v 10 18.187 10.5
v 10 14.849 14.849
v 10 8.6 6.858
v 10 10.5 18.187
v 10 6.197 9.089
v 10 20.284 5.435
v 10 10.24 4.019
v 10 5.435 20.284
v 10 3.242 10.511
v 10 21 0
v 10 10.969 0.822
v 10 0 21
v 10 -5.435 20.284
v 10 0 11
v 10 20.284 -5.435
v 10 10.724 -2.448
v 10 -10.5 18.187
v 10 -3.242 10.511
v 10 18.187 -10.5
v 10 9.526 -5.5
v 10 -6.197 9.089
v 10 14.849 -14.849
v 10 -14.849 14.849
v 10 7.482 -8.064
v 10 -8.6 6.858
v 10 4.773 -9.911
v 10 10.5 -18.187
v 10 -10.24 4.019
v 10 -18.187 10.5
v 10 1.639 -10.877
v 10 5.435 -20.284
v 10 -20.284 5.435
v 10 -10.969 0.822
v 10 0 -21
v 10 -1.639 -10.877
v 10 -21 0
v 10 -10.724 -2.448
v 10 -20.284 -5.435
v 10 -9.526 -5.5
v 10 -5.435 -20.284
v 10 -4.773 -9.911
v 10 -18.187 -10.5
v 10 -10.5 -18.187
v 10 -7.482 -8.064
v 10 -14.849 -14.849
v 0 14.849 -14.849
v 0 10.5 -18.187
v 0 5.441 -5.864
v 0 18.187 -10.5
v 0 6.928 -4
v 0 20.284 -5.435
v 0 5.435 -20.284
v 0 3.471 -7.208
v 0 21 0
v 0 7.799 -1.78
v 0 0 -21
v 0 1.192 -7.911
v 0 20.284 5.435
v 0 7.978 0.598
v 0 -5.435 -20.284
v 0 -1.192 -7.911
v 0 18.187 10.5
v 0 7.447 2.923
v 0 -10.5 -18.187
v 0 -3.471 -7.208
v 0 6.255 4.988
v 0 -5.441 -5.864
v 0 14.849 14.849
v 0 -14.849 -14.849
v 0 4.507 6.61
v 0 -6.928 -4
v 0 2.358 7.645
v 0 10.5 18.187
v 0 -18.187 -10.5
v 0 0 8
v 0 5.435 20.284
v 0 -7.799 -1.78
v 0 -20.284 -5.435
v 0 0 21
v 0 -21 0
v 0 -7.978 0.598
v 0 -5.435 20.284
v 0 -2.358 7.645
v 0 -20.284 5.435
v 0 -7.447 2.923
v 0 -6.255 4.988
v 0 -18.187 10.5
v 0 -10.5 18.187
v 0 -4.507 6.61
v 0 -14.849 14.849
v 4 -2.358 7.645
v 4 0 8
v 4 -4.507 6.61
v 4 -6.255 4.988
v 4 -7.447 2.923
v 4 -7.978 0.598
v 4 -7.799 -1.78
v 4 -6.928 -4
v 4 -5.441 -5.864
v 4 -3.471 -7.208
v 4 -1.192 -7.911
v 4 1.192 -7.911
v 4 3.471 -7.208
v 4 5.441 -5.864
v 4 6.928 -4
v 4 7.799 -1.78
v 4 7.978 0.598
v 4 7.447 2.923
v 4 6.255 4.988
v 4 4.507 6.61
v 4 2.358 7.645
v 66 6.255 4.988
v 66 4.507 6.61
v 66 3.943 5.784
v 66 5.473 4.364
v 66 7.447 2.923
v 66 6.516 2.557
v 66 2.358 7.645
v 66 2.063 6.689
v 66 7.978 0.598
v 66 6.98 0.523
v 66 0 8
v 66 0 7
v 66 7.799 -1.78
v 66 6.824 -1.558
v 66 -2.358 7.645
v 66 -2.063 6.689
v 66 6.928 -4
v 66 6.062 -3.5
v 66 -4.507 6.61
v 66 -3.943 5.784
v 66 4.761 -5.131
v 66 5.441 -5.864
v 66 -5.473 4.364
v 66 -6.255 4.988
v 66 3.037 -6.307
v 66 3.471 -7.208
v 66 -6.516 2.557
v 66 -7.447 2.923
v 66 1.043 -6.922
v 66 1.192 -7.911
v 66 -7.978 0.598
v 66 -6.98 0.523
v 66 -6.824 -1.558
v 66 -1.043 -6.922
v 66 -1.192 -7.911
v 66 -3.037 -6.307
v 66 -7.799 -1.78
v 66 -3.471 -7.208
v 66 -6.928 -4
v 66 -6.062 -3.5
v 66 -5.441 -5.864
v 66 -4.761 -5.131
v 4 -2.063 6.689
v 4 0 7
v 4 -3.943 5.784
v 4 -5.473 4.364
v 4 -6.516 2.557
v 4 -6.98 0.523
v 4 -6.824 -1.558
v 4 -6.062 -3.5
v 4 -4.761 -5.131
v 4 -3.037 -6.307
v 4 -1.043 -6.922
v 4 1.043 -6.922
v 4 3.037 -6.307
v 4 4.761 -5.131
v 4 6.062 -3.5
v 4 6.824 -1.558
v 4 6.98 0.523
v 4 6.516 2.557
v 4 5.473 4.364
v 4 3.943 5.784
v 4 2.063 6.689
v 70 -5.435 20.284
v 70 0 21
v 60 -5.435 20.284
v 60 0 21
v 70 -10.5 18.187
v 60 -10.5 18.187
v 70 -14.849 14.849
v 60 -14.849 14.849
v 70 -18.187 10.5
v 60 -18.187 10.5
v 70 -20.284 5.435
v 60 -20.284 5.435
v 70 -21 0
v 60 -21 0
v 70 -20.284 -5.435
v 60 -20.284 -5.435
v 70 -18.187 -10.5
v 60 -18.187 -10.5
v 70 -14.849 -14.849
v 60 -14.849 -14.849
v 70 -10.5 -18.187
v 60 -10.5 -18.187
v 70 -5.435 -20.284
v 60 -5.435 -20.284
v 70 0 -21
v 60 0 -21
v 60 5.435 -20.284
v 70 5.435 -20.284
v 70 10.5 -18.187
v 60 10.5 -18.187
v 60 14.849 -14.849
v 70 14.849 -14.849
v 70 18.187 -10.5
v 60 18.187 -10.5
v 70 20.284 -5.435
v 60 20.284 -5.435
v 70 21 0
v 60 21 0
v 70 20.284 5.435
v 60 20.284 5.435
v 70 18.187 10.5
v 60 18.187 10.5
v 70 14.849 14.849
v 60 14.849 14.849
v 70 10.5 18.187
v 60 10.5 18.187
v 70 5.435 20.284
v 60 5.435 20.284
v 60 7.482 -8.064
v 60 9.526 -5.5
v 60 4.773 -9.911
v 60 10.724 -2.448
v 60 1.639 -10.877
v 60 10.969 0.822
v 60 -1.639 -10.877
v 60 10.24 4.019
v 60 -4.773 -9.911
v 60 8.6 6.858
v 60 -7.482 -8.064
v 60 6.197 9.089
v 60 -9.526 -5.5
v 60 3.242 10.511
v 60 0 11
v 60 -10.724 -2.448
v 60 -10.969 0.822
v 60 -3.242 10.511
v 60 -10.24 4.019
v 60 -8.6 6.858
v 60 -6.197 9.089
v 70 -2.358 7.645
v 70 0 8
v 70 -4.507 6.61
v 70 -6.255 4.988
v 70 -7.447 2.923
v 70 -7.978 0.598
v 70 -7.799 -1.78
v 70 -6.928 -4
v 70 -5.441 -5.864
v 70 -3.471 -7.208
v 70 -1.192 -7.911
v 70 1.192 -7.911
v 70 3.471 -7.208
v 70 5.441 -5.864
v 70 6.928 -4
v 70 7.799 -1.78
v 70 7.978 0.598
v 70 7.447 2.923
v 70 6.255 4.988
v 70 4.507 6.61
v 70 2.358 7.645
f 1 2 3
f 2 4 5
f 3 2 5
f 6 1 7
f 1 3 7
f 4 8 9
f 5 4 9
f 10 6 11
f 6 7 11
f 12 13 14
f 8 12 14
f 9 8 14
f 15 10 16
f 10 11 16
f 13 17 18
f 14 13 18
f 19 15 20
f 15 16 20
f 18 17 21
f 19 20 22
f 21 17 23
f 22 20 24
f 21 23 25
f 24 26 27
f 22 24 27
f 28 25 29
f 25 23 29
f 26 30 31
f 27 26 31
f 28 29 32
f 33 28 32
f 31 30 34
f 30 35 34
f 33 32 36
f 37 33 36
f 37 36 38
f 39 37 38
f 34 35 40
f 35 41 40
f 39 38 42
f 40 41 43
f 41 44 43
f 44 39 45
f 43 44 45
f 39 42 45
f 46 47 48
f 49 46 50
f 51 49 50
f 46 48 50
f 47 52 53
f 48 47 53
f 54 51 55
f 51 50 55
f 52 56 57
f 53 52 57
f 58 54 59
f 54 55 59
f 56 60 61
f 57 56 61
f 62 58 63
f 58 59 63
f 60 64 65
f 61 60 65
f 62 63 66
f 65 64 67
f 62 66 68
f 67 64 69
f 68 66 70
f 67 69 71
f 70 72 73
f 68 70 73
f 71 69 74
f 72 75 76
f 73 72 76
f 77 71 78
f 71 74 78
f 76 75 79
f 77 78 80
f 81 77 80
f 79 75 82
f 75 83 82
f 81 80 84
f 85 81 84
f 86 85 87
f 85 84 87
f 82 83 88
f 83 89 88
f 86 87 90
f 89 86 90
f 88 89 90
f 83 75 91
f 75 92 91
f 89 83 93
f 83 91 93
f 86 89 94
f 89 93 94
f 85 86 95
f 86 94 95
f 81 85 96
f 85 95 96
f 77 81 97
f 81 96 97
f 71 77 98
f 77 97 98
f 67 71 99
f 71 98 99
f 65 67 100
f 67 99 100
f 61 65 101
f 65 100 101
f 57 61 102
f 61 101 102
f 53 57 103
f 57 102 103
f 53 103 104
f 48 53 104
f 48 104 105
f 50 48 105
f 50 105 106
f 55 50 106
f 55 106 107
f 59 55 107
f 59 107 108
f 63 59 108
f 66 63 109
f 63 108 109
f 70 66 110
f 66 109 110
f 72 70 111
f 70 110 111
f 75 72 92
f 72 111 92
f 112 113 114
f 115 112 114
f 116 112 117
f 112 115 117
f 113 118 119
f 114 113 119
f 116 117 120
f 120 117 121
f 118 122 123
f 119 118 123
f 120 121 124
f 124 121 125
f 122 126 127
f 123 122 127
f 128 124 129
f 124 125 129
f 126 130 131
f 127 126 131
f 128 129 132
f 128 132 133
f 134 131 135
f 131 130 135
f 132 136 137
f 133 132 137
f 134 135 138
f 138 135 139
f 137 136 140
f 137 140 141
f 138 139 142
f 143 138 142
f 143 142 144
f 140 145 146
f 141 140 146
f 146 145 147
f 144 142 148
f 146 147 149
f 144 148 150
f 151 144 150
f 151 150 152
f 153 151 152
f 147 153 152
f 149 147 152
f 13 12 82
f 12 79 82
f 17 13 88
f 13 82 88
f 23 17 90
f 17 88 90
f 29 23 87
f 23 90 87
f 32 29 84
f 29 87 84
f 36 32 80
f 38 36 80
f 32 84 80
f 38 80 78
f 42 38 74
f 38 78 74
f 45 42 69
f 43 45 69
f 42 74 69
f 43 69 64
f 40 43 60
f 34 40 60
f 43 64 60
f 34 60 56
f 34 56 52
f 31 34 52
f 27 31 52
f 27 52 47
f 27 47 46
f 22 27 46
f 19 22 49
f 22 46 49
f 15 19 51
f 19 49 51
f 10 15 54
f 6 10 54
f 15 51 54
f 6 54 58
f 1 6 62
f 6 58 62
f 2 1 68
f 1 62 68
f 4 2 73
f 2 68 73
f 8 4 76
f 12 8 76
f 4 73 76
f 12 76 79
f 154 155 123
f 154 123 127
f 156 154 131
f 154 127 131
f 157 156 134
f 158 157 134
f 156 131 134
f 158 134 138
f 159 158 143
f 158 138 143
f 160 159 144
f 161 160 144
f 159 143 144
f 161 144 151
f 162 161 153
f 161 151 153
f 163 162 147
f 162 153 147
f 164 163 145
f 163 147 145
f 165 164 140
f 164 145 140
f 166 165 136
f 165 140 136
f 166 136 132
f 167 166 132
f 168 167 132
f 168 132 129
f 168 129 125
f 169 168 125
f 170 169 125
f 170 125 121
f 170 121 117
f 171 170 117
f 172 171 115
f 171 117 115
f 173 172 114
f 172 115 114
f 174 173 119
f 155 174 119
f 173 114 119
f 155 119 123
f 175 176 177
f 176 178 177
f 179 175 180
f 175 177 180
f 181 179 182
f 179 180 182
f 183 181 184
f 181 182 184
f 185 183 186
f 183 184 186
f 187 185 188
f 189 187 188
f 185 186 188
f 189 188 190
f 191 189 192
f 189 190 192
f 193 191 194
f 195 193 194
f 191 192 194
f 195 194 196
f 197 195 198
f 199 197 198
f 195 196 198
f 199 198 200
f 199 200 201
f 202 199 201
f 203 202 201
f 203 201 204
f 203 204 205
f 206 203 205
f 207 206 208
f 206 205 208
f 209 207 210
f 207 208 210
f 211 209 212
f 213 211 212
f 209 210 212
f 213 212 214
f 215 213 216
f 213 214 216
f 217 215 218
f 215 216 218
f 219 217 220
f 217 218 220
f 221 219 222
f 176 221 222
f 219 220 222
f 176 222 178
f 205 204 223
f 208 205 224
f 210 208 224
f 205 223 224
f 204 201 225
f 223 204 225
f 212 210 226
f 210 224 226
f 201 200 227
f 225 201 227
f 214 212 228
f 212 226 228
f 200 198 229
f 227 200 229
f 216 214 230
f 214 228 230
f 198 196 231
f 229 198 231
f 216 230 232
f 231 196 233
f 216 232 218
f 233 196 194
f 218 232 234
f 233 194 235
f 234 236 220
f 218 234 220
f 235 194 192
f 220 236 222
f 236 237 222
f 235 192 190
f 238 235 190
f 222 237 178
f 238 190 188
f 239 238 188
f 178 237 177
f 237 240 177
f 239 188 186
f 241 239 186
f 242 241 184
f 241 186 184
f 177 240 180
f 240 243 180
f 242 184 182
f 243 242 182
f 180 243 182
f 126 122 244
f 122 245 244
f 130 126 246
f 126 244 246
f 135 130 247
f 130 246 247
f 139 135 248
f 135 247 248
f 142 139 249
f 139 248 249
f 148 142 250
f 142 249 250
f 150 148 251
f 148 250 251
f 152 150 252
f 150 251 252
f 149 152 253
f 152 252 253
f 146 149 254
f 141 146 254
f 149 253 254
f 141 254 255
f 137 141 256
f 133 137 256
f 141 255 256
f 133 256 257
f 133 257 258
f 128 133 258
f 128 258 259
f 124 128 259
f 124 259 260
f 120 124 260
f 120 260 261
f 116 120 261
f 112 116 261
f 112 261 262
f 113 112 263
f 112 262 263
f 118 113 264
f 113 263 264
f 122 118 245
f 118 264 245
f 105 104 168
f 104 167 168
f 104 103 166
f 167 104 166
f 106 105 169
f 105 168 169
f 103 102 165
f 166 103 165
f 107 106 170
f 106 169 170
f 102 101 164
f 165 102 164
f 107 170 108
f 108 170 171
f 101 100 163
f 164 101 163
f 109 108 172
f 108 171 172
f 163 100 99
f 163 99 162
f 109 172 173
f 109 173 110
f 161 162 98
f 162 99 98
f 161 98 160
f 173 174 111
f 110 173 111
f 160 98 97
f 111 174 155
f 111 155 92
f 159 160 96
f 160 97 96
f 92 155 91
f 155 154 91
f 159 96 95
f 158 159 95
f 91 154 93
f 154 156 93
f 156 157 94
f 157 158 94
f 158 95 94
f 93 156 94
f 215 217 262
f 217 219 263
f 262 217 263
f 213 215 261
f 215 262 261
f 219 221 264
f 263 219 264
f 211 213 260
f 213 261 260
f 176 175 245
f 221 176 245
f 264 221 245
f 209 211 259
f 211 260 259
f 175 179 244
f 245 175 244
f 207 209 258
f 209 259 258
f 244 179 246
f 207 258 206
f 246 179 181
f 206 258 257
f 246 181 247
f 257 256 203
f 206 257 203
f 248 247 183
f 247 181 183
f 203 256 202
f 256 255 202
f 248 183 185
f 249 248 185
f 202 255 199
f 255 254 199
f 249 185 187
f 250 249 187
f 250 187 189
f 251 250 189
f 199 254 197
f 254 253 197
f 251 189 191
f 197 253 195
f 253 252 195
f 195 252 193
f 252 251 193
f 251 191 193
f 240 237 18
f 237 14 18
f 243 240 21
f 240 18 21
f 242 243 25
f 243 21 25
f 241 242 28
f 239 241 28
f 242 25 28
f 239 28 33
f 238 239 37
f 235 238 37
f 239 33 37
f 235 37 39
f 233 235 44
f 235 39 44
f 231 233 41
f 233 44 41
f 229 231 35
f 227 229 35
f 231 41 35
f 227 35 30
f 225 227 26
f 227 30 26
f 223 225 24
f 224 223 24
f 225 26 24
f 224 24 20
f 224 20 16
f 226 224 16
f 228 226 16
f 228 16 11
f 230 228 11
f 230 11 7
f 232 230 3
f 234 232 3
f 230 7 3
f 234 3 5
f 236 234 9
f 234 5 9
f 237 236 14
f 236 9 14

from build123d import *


with BuildPart() as part:
    # 草图1 → 旋转1 (revolve)
    with BuildSketch(Plane(origin=(0, 0, 0), x_dir=(1, 0, 0), z_dir=(0, 1, 0)), mode=Mode.PRIVATE) as revolve_1_sk:
        Polygon((66, 7), (66, 8), (70, 8), (70, 21), (60, 21), (60, 11), (10, 11), (10, 21), (0, 21), (0, 8), (4, 8), (4, 7), align=None)
    revolve(revolve_1_sk.sketch.rotate(Axis((-74.515541445, 0, 0), (1, 0, 0)), 180), axis=Axis((-74.515541445, 0, 0), (1, 0, 0)))


solid = part.part
